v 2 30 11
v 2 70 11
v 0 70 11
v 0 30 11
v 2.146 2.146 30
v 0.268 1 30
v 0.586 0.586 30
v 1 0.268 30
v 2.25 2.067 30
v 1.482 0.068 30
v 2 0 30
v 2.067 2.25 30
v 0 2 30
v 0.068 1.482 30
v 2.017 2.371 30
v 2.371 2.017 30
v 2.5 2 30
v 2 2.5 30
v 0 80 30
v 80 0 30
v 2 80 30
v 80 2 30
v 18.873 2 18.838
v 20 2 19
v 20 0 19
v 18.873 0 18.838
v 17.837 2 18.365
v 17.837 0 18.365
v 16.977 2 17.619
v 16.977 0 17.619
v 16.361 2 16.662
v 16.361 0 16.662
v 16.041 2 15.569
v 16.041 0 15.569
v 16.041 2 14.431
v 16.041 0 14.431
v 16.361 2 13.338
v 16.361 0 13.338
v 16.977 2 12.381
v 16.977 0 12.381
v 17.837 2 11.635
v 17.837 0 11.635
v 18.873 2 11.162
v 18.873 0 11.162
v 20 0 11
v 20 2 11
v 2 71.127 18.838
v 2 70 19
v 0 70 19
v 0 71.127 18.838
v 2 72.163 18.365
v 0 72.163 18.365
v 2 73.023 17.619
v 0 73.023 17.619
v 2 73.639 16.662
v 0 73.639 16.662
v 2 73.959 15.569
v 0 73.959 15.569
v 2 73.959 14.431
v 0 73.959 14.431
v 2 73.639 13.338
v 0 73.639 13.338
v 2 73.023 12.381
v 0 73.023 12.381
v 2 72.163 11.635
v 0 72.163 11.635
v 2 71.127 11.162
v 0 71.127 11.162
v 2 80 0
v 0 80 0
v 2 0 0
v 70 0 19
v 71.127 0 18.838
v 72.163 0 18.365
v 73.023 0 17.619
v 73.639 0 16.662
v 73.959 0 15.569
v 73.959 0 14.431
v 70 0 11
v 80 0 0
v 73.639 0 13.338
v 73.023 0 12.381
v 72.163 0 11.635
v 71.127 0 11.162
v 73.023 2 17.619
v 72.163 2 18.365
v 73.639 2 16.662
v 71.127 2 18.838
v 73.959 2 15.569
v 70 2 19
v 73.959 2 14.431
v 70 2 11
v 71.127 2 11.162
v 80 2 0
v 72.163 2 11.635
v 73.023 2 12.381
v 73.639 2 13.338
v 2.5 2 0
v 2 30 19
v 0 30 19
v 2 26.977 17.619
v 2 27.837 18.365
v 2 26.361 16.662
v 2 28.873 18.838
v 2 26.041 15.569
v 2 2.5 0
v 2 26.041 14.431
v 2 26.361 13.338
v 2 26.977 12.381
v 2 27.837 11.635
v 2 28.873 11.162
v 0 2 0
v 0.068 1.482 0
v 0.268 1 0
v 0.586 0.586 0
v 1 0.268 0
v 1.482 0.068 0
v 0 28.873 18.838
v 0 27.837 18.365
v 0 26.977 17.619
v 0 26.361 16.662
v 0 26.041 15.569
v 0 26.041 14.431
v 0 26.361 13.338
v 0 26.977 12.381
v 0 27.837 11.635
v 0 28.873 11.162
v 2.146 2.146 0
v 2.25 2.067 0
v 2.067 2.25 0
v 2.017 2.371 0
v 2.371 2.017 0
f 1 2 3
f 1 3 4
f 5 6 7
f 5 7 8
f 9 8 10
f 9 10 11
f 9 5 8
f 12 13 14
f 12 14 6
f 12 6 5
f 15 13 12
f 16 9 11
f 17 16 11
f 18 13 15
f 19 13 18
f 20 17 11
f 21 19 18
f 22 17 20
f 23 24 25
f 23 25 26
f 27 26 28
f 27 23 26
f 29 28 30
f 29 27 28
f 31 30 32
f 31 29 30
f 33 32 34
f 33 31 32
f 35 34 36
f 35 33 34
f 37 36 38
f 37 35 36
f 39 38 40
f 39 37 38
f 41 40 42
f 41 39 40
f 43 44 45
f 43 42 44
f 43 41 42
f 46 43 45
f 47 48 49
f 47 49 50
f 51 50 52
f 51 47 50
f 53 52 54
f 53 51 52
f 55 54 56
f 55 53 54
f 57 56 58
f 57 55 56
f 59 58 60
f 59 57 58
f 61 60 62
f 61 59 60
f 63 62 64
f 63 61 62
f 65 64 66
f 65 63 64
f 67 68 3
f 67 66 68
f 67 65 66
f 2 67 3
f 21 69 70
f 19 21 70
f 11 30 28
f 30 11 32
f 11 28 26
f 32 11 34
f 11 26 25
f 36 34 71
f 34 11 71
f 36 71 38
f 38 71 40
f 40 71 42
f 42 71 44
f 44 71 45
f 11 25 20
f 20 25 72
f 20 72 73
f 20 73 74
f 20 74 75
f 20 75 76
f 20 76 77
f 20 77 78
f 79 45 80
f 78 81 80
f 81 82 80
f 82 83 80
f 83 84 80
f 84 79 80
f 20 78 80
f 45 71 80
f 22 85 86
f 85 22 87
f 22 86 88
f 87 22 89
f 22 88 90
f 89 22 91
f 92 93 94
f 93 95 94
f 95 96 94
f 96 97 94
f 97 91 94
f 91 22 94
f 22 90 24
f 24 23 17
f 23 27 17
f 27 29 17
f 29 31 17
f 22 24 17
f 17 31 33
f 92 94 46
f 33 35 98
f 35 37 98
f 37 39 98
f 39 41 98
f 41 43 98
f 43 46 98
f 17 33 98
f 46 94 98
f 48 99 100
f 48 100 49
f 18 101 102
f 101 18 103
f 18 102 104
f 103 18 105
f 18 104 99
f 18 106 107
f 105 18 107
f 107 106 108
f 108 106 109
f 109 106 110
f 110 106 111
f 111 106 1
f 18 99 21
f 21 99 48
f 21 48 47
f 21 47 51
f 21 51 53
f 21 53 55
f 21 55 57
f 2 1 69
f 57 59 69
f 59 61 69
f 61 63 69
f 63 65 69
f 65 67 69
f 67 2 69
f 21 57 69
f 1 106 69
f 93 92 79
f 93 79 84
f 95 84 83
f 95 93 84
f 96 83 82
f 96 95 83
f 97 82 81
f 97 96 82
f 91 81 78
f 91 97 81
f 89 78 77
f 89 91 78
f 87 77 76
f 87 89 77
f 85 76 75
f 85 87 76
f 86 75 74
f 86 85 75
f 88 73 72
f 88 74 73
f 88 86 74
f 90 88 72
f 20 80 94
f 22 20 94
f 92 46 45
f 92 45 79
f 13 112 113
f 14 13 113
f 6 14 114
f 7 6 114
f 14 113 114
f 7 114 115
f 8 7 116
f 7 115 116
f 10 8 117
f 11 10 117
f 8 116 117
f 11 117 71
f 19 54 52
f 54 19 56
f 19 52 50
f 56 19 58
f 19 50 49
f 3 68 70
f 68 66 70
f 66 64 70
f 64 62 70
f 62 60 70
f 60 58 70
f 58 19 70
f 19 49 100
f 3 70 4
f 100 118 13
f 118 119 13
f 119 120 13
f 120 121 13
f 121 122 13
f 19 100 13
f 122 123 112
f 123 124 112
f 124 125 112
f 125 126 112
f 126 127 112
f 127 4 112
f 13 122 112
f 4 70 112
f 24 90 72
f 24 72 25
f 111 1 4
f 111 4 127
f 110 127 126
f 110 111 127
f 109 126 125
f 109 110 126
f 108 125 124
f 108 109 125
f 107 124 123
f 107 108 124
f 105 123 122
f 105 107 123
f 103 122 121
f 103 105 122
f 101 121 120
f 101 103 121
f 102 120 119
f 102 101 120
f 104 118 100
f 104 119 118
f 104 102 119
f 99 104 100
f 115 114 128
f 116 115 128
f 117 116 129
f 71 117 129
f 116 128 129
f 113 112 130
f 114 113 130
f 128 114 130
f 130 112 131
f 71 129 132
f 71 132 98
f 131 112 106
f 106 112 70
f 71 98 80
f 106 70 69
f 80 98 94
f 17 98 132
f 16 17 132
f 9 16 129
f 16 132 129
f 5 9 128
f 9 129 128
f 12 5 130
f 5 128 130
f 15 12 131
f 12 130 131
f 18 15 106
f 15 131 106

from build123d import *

# Parameters (mm, degrees)
BOSS_EXTRUDE1_DEPTH = 30
CUT_EXTRUDE1_REACH  = 117.689
CUT_EXTRUDE2_REACH  = 117.689


with BuildPart() as part:
    # Sketch1 → Boss-Extrude1 (new body)
    with BuildSketch(Plane.XY):
        with BuildLine():
            Line((0, 80), (0, 2))
            ThreePointArc((0, 2), (0.585786438, 0.585786438), (2, 0))
            Line((2, 0), (80, 0))
            Line((80, 0), (80, 2))
            Line((80, 2), (2.5, 2))
            ThreePointArc((2.5, 2), (2.146446609, 2.146446609), (2, 2.5))
            Line((2, 2.5), (2, 80))
            Line((2, 80), (0, 80))
        make_face()
    extrude(amount=BOSS_EXTRUDE1_DEPTH)

    # Sketch2 → Cut-Extrude1 (cut, up to next)
    with BuildSketch(Plane(origin=(0, 2, 0), x_dir=(1, 0, 0), z_dir=(0, 1, 0)), mode=Mode.PRIVATE) as cut_extrude1_sk1:
        with BuildLine():
            Line((70, -19), (20, -19))
            ThreePointArc((20, -19), (16, -15), (20, -11))
            Line((20, -11), (70, -11))
            ThreePointArc((70, -11), (74, -15), (70, -19))
        make_face()
    cut_extrude1_tool1 = extrude(cut_extrude1_sk1.sketch, amount=-CUT_EXTRUDE1_REACH, mode=Mode.PRIVATE) & part.part
    add(cut_extrude1_tool1.solids().sort_by_distance((45, 2, 15))[0], mode=Mode.SUBTRACT)

    # Sketch3 → Cut-Extrude2 (cut, up to next)
    with BuildSketch(Plane(origin=(2, 0, 0), x_dir=(0, 0, -1), z_dir=(1, 0, 0)), mode=Mode.PRIVATE) as cut_extrude2_sk1:
        with BuildLine():
            Line((-11, 70), (-11, 30))
            ThreePointArc((-11, 30), (-15, 26), (-19, 30))
            Line((-19, 30), (-19, 70))
            ThreePointArc((-19, 70), (-15, 74), (-11, 70))
        make_face()
    cut_extrude2_tool1 = extrude(cut_extrude2_sk1.sketch, amount=-CUT_EXTRUDE2_REACH, mode=Mode.PRIVATE) & part.part
    add(cut_extrude2_tool1.solids().sort_by_distance((2, 50, 15))[0], mode=Mode.SUBTRACT)


solid = part.part
